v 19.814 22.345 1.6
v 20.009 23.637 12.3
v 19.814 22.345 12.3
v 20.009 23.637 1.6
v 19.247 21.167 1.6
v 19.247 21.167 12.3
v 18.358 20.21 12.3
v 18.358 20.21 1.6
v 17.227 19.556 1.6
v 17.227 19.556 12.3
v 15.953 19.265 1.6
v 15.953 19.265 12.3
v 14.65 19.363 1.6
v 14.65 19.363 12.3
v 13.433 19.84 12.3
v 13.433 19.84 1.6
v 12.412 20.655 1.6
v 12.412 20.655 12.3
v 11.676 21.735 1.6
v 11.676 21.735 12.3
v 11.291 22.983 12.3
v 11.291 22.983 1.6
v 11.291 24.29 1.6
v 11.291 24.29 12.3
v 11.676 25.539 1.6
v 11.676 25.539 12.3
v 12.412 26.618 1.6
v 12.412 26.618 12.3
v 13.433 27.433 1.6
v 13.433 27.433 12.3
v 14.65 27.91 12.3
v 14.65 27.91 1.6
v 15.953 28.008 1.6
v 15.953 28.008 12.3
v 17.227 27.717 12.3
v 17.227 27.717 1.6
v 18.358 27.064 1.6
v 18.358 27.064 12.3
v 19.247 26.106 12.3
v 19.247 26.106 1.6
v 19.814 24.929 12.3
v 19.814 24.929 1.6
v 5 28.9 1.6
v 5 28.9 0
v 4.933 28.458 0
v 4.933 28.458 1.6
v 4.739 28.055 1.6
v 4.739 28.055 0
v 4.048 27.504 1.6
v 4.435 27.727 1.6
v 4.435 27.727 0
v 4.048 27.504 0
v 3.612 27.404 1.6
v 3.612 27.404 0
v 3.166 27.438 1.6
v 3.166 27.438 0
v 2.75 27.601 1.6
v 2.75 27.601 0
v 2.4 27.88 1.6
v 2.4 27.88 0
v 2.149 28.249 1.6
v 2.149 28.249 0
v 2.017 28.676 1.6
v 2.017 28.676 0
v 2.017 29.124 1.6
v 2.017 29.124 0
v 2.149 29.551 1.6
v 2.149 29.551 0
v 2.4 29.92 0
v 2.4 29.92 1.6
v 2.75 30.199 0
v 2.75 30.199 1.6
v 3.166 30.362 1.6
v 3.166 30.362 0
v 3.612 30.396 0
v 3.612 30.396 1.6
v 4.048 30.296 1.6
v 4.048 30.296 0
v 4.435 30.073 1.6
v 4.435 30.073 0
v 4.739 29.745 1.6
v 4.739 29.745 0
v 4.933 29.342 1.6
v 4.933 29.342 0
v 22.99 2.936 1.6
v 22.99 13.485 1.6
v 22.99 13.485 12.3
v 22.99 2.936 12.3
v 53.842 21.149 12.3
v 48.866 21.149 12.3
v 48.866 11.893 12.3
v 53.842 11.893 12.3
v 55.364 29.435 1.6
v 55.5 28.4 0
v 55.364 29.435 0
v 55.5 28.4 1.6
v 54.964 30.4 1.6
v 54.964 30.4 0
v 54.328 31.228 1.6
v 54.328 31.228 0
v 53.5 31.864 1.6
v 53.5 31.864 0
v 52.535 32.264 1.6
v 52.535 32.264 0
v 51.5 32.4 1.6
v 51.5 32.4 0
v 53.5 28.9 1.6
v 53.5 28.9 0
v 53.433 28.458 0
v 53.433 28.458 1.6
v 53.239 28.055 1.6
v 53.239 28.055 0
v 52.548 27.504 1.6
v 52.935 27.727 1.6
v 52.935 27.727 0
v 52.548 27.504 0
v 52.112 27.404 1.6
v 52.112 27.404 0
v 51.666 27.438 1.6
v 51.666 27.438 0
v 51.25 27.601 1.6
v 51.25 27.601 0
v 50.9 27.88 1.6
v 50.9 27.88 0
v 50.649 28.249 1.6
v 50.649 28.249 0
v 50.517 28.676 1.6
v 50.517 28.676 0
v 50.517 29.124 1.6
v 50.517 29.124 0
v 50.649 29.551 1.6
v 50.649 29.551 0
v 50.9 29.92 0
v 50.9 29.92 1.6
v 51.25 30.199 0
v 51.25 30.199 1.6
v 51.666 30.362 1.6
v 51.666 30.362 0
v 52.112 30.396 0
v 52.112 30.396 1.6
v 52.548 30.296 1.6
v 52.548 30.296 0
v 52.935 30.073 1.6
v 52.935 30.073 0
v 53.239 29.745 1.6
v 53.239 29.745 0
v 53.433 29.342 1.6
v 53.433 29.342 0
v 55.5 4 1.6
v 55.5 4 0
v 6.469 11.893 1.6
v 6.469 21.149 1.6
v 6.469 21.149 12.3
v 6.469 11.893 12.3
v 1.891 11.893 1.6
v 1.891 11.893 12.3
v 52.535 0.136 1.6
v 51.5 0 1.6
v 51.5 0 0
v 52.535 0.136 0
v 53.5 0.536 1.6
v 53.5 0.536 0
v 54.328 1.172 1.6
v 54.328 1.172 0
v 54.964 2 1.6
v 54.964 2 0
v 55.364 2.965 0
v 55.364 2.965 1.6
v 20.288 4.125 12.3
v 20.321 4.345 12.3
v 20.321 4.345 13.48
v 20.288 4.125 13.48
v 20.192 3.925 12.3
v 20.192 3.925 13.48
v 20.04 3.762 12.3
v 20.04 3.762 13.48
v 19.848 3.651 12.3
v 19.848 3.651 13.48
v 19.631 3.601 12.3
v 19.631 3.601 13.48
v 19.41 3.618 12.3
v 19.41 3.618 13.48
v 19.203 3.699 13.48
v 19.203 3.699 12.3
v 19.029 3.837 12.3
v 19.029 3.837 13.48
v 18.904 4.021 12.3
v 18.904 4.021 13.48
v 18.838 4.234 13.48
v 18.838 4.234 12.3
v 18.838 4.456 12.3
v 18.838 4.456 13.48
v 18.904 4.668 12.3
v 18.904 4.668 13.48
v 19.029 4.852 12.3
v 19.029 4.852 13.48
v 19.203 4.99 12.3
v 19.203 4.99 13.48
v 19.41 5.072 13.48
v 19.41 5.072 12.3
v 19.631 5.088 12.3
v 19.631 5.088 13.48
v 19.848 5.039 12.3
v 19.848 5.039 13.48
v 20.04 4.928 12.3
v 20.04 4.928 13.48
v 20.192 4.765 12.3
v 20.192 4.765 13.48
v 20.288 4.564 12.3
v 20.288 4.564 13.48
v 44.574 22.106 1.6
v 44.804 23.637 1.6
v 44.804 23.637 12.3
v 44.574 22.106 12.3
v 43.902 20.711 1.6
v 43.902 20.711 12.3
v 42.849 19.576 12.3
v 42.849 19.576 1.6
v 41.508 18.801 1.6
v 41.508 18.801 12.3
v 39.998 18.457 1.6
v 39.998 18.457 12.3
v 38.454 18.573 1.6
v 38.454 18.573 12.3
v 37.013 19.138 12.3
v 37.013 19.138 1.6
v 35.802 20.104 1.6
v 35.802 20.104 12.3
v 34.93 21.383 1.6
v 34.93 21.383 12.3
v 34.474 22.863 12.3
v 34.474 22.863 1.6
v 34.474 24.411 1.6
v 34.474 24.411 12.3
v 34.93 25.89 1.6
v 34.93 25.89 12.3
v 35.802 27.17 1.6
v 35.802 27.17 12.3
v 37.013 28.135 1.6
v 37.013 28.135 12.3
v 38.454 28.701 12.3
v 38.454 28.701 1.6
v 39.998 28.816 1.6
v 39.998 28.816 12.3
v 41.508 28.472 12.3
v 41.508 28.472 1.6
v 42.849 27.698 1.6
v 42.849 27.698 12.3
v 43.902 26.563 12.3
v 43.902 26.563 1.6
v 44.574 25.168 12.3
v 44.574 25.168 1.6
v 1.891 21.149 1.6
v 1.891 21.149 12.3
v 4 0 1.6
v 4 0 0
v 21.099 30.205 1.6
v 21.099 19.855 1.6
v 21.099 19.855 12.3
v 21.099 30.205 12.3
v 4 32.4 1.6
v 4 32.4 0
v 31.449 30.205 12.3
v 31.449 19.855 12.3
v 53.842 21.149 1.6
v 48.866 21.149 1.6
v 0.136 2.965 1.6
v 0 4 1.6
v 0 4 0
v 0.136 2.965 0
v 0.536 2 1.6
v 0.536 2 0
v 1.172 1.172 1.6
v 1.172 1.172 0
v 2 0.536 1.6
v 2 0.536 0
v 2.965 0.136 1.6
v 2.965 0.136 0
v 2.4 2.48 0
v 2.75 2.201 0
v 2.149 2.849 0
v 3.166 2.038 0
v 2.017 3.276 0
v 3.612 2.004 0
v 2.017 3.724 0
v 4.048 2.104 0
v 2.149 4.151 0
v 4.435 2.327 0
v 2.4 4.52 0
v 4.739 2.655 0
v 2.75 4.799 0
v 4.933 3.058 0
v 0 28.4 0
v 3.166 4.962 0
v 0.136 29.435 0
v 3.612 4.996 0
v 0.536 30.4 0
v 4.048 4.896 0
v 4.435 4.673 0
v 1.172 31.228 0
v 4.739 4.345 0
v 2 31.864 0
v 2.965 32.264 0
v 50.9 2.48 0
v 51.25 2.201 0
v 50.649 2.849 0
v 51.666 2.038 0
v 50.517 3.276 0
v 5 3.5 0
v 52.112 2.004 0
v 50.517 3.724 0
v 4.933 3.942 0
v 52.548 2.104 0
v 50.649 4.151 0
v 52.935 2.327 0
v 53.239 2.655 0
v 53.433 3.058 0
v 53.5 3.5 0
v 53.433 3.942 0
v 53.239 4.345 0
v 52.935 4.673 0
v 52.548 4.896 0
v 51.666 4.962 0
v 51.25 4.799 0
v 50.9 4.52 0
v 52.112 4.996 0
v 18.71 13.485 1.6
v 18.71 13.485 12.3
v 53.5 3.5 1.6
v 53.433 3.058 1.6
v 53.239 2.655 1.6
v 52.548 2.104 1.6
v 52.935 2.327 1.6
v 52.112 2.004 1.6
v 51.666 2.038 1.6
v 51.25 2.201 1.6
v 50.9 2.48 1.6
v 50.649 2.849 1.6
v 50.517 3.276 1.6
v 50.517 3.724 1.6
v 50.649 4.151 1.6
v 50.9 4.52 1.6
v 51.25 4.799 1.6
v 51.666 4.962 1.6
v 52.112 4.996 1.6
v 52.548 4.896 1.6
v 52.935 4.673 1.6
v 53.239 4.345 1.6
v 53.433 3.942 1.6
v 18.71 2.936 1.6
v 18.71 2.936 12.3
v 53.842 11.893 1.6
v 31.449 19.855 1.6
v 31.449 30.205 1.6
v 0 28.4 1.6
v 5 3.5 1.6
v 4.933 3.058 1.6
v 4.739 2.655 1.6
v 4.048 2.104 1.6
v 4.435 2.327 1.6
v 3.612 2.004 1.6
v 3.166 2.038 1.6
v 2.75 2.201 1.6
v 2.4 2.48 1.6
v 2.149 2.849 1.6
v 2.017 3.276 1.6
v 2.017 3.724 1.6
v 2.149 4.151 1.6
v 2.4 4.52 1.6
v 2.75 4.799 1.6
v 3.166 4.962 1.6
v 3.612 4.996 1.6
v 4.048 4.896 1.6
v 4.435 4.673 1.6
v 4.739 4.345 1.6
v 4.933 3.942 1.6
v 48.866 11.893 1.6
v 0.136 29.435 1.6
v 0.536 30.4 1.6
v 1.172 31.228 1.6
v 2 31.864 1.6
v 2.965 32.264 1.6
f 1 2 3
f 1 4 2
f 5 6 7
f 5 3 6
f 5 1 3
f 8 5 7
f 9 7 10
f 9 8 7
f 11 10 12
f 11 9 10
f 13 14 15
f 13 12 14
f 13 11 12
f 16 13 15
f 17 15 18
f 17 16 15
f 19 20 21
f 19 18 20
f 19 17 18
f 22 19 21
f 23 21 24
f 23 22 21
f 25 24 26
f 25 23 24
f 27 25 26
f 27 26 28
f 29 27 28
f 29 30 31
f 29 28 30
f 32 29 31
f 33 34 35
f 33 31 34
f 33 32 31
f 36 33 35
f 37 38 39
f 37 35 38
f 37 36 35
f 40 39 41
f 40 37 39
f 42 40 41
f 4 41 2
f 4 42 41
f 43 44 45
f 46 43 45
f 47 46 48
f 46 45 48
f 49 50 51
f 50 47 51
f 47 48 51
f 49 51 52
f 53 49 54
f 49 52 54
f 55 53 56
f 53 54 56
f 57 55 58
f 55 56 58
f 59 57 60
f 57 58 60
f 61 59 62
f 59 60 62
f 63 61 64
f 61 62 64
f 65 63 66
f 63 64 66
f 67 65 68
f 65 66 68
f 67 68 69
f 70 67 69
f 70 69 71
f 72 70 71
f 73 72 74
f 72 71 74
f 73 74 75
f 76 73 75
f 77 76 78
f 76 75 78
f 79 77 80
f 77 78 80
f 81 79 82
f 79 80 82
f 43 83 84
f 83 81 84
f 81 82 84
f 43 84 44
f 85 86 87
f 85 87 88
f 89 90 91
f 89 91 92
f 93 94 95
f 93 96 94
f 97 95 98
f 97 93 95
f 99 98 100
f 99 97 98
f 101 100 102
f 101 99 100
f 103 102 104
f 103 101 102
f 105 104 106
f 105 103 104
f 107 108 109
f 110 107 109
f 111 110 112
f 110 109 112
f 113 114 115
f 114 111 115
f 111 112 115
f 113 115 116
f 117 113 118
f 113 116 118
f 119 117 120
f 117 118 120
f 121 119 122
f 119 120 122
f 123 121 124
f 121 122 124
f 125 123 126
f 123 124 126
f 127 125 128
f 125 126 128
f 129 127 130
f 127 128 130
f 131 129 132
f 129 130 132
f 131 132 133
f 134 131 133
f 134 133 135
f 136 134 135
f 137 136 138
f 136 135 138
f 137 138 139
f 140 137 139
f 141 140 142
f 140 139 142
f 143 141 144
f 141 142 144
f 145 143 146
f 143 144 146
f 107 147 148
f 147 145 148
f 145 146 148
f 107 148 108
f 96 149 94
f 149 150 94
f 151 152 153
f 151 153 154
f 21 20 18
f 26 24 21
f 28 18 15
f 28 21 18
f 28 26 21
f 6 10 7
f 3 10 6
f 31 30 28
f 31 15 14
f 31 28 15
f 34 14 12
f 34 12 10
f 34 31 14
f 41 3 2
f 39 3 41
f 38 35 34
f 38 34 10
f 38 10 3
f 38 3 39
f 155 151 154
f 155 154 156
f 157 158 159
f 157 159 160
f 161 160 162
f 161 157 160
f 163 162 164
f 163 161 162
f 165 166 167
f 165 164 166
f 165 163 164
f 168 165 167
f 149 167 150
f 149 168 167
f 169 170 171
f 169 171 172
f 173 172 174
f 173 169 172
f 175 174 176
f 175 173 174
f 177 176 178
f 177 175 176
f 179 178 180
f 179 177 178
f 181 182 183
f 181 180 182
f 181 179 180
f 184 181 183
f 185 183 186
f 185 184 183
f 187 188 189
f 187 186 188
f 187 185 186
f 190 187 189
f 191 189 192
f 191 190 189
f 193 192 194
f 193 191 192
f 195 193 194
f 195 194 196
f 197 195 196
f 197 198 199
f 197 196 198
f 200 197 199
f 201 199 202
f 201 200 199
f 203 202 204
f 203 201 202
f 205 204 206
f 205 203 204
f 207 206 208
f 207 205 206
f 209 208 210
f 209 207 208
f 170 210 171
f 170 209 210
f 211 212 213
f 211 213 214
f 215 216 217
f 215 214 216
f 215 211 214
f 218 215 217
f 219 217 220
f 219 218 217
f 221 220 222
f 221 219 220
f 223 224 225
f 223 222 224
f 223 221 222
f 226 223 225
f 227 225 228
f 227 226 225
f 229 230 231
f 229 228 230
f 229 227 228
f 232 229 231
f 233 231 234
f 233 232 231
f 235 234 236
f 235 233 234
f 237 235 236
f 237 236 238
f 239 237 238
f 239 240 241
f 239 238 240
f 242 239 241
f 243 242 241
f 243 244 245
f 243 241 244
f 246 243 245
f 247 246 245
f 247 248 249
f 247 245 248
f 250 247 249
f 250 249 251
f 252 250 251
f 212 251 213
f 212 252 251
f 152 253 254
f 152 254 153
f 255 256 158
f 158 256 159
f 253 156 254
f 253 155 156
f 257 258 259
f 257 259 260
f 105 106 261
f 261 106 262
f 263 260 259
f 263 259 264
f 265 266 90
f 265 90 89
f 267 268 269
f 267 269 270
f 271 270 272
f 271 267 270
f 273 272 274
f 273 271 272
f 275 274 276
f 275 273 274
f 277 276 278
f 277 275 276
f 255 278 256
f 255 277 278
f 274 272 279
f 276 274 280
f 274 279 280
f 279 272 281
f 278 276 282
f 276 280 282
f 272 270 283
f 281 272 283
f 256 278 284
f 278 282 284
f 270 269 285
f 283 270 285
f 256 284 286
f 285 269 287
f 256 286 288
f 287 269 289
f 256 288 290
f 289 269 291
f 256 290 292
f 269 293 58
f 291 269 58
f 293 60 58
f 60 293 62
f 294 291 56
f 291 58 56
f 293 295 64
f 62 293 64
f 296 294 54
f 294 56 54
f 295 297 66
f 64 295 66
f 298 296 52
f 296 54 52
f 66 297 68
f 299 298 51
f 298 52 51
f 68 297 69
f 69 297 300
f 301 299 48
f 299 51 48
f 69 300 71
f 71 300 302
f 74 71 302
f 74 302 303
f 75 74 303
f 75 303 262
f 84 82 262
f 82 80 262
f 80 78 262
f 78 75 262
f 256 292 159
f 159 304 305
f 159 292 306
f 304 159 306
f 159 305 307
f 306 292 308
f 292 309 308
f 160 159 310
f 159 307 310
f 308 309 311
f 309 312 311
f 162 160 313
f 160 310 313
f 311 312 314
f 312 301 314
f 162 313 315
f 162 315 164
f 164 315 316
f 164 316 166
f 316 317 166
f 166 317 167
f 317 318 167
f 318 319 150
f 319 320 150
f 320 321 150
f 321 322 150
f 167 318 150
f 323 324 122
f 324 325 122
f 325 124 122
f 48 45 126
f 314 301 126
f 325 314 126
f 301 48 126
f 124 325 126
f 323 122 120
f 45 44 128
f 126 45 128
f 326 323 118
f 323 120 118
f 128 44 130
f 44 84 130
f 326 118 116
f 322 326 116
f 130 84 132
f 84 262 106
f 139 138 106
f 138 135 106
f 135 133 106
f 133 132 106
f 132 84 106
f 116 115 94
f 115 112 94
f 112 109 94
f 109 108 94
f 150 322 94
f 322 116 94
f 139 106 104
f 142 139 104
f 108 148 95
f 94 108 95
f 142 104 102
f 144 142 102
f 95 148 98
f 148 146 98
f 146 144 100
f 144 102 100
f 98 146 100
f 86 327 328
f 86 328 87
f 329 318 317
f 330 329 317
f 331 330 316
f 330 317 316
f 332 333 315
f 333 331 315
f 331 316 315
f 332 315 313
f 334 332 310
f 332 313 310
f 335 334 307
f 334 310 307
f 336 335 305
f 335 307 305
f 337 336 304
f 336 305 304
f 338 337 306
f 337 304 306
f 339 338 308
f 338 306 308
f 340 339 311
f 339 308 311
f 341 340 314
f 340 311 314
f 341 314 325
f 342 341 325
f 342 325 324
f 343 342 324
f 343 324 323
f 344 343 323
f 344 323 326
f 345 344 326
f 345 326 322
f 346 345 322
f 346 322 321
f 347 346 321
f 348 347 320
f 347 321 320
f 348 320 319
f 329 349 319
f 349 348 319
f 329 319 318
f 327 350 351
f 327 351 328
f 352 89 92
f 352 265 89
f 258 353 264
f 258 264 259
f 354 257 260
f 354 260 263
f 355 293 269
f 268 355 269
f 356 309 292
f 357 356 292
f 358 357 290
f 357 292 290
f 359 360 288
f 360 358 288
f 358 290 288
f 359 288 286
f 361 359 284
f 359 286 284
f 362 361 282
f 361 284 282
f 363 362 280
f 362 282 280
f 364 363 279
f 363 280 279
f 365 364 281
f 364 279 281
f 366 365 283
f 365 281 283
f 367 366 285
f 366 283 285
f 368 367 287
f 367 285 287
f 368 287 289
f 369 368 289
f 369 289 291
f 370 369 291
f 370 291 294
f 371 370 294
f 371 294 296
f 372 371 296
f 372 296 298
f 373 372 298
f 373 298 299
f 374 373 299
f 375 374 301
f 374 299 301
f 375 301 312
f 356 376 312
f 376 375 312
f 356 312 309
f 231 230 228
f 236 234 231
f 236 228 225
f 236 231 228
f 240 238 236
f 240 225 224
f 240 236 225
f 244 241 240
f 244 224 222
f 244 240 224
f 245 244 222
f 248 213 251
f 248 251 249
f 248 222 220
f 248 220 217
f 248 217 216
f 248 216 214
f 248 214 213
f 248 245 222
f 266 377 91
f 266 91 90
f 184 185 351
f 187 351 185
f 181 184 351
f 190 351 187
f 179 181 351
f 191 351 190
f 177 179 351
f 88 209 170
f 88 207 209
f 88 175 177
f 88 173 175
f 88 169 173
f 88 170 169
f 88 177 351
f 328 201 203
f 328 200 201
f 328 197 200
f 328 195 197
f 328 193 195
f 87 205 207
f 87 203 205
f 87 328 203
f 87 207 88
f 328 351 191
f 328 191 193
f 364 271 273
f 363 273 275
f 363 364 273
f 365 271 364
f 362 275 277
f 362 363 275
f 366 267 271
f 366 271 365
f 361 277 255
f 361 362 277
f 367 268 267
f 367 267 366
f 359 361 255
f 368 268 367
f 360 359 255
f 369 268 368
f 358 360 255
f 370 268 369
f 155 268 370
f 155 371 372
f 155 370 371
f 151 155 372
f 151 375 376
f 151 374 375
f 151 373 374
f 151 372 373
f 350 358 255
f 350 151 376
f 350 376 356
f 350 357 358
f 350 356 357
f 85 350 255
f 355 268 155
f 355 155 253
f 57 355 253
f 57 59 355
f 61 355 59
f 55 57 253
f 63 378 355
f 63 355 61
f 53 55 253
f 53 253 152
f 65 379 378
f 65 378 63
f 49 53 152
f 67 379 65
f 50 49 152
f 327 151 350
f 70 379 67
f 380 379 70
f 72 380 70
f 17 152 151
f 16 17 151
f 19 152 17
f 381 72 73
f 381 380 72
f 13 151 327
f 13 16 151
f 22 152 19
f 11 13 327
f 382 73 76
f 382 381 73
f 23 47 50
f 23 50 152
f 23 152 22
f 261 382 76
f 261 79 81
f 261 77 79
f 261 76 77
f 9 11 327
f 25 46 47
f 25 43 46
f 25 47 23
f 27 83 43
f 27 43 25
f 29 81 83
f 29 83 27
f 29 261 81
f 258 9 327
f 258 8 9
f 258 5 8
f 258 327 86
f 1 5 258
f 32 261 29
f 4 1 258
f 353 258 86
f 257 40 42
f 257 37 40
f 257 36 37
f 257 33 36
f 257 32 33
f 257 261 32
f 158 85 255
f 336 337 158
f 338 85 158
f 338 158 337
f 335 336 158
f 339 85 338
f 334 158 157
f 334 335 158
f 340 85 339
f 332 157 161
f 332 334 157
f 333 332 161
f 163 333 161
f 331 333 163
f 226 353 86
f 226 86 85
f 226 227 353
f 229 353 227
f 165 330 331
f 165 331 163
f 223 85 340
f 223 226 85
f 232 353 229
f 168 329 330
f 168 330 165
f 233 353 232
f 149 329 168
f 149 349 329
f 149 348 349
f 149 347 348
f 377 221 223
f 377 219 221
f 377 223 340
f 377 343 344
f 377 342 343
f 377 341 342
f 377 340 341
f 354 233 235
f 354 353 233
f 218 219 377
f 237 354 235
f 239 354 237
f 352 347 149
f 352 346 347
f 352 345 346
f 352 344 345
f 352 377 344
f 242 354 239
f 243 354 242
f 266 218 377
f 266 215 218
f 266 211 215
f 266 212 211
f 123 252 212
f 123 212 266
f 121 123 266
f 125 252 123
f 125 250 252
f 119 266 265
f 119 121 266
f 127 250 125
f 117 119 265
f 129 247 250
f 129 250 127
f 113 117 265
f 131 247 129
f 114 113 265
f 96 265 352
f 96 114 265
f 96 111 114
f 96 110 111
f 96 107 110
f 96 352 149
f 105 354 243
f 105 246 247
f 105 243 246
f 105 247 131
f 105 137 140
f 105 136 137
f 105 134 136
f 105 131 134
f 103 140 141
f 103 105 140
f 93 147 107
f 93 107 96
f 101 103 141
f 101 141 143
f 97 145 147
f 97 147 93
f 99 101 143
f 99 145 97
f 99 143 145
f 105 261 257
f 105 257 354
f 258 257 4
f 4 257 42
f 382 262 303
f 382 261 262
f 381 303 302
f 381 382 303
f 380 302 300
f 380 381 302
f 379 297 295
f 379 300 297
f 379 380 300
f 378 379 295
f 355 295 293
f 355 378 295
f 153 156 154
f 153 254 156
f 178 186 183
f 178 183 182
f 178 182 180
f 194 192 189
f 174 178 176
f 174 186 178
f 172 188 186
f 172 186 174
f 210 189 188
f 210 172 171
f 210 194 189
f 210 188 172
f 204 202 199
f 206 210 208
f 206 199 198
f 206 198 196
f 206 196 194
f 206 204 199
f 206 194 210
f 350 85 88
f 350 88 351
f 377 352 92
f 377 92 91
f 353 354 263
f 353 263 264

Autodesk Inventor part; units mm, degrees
ref_plane "YZ Plane" through (0, 0, 0) normal (1, 0, 0) x (0, 1, 0)
ref_plane "XZ Plane" through (0, 0, 0) normal (0, 1, 0) x (-1, 0, 0)
ref_plane "XY Plane" through (0, 0, 0) normal (0, 0, 1) x (1, 0, 0)
sketch "Sketch1" plane through (0, 0, 0) normal (0, 0, 1) x (1, 0, 0)
  line L0 (0, 0) -> (55.5, 0)
  line L1 (55.5, 0) -> (55.5, 32.4)
  line L2 (55.5, 32.4) -> (0, 32.4)
  line L3 (0, 32.4) -> (0, 0)
  circle A0 centre (3.5, 28.9) radius 1.5
  circle A1 centre (52, 28.9) radius 1.5
  circle A2 centre (3.5, 3.5) radius 1.5
  circle A3 centre (52, 3.5) radius 1.5
  dimension "d0" = 55.5
  dimension "d1" = 32.4
  dimension "d2" = 3
  dimension "d3" = 3
  dimension "d4" = 3
  dimension "d5" = 3
  dimension "d6" = 3.5
  dimension "d7" = 3.5
  dimension "d8" = 3.5
  dimension "d9" = 3.5
  dimension "d10" = 3.5
  dimension "d11" = 3.5
  dimension "d12" = 3.5
  dimension "d13" = 3.5
extrude "Extrusion1" add sketch "Sketch1" along normal blind 1.6
fillet "Fillet1" radius 4 4 edges at (55.5, 32.4, 0.8) (55.5, 0, 0.8) (0, 0, 0.8) (0, 32.4, 0.8)
sketch "Sketch2" plane through (0, 0, 1.6) normal (0, 0, 1) x (1, 0, 0)
  circle A0 centre (15.6251, 23.6367) radius 4.3835
  circle A1 centre (39.6101, 23.6367) radius 5.1943
  line L0 (1.8909, 21.1486) -> (6.469, 21.1486)
  line L1 (6.469, 21.1486) -> (6.469, 11.893)
  line L2 (6.469, 11.893) -> (1.8909, 11.893)
  line L3 (1.8909, 11.893) -> (1.8909, 21.1486)
  line L4 (48.8658, 21.1486) -> (53.8419, 21.1486)
  line L5 (53.8419, 21.1486) -> (53.8419, 11.893)
  line L6 (53.8419, 11.893) -> (48.8658, 11.893)
  line L7 (48.8658, 11.893) -> (48.8658, 21.1486)
  line L8 (21.0989, 30.2052) -> (31.4492, 30.2052)
  line L9 (31.4492, 30.2052) -> (31.4492, 19.8548)
  line L10 (31.4492, 19.8548) -> (21.0989, 19.8548)
  line L11 (21.0989, 19.8548) -> (21.0989, 30.2052)
  line L12 (18.7103, 13.4854) -> (22.9898, 13.4854)
  line L13 (22.9898, 13.4854) -> (22.9898, 2.9359)
  line L14 (22.9898, 2.9359) -> (18.7103, 2.9359)
  line L15 (18.7103, 2.9359) -> (18.7103, 13.4854)
  point P0 (0, 0)
extrude "Extrusion2" add sketch "Sketch2" along normal blind 10.7
sketch "Sketch3" plane through (0, 0, 12.3) normal (0, 0, 1) x (1, 0, 0)
  circle A0 centre (19.5755, 4.3447) radius 0.7457
  point P0 (0, 0)
extrude "Extrusion3" add sketch "Sketch3" along normal blind 1.18
properties part number "PowerSupply"
